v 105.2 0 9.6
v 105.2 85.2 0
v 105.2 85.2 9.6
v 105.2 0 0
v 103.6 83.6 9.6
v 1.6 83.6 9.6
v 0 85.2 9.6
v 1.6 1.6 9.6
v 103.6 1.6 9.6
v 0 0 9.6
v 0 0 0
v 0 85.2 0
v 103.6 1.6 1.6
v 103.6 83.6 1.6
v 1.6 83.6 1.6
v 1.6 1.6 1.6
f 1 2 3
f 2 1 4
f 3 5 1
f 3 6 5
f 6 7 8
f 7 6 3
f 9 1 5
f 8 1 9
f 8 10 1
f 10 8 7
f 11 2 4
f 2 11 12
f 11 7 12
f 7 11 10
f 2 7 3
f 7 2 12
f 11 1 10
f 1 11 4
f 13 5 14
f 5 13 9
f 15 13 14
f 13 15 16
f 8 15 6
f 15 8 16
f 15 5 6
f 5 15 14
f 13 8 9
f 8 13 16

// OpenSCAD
a=102;
b=82;
c=8;
t=1.6;

difference() {
cube([a+t+t,b+t+t,c+t]);
translate([t,t,t])
cube([a,b,c]);
}
